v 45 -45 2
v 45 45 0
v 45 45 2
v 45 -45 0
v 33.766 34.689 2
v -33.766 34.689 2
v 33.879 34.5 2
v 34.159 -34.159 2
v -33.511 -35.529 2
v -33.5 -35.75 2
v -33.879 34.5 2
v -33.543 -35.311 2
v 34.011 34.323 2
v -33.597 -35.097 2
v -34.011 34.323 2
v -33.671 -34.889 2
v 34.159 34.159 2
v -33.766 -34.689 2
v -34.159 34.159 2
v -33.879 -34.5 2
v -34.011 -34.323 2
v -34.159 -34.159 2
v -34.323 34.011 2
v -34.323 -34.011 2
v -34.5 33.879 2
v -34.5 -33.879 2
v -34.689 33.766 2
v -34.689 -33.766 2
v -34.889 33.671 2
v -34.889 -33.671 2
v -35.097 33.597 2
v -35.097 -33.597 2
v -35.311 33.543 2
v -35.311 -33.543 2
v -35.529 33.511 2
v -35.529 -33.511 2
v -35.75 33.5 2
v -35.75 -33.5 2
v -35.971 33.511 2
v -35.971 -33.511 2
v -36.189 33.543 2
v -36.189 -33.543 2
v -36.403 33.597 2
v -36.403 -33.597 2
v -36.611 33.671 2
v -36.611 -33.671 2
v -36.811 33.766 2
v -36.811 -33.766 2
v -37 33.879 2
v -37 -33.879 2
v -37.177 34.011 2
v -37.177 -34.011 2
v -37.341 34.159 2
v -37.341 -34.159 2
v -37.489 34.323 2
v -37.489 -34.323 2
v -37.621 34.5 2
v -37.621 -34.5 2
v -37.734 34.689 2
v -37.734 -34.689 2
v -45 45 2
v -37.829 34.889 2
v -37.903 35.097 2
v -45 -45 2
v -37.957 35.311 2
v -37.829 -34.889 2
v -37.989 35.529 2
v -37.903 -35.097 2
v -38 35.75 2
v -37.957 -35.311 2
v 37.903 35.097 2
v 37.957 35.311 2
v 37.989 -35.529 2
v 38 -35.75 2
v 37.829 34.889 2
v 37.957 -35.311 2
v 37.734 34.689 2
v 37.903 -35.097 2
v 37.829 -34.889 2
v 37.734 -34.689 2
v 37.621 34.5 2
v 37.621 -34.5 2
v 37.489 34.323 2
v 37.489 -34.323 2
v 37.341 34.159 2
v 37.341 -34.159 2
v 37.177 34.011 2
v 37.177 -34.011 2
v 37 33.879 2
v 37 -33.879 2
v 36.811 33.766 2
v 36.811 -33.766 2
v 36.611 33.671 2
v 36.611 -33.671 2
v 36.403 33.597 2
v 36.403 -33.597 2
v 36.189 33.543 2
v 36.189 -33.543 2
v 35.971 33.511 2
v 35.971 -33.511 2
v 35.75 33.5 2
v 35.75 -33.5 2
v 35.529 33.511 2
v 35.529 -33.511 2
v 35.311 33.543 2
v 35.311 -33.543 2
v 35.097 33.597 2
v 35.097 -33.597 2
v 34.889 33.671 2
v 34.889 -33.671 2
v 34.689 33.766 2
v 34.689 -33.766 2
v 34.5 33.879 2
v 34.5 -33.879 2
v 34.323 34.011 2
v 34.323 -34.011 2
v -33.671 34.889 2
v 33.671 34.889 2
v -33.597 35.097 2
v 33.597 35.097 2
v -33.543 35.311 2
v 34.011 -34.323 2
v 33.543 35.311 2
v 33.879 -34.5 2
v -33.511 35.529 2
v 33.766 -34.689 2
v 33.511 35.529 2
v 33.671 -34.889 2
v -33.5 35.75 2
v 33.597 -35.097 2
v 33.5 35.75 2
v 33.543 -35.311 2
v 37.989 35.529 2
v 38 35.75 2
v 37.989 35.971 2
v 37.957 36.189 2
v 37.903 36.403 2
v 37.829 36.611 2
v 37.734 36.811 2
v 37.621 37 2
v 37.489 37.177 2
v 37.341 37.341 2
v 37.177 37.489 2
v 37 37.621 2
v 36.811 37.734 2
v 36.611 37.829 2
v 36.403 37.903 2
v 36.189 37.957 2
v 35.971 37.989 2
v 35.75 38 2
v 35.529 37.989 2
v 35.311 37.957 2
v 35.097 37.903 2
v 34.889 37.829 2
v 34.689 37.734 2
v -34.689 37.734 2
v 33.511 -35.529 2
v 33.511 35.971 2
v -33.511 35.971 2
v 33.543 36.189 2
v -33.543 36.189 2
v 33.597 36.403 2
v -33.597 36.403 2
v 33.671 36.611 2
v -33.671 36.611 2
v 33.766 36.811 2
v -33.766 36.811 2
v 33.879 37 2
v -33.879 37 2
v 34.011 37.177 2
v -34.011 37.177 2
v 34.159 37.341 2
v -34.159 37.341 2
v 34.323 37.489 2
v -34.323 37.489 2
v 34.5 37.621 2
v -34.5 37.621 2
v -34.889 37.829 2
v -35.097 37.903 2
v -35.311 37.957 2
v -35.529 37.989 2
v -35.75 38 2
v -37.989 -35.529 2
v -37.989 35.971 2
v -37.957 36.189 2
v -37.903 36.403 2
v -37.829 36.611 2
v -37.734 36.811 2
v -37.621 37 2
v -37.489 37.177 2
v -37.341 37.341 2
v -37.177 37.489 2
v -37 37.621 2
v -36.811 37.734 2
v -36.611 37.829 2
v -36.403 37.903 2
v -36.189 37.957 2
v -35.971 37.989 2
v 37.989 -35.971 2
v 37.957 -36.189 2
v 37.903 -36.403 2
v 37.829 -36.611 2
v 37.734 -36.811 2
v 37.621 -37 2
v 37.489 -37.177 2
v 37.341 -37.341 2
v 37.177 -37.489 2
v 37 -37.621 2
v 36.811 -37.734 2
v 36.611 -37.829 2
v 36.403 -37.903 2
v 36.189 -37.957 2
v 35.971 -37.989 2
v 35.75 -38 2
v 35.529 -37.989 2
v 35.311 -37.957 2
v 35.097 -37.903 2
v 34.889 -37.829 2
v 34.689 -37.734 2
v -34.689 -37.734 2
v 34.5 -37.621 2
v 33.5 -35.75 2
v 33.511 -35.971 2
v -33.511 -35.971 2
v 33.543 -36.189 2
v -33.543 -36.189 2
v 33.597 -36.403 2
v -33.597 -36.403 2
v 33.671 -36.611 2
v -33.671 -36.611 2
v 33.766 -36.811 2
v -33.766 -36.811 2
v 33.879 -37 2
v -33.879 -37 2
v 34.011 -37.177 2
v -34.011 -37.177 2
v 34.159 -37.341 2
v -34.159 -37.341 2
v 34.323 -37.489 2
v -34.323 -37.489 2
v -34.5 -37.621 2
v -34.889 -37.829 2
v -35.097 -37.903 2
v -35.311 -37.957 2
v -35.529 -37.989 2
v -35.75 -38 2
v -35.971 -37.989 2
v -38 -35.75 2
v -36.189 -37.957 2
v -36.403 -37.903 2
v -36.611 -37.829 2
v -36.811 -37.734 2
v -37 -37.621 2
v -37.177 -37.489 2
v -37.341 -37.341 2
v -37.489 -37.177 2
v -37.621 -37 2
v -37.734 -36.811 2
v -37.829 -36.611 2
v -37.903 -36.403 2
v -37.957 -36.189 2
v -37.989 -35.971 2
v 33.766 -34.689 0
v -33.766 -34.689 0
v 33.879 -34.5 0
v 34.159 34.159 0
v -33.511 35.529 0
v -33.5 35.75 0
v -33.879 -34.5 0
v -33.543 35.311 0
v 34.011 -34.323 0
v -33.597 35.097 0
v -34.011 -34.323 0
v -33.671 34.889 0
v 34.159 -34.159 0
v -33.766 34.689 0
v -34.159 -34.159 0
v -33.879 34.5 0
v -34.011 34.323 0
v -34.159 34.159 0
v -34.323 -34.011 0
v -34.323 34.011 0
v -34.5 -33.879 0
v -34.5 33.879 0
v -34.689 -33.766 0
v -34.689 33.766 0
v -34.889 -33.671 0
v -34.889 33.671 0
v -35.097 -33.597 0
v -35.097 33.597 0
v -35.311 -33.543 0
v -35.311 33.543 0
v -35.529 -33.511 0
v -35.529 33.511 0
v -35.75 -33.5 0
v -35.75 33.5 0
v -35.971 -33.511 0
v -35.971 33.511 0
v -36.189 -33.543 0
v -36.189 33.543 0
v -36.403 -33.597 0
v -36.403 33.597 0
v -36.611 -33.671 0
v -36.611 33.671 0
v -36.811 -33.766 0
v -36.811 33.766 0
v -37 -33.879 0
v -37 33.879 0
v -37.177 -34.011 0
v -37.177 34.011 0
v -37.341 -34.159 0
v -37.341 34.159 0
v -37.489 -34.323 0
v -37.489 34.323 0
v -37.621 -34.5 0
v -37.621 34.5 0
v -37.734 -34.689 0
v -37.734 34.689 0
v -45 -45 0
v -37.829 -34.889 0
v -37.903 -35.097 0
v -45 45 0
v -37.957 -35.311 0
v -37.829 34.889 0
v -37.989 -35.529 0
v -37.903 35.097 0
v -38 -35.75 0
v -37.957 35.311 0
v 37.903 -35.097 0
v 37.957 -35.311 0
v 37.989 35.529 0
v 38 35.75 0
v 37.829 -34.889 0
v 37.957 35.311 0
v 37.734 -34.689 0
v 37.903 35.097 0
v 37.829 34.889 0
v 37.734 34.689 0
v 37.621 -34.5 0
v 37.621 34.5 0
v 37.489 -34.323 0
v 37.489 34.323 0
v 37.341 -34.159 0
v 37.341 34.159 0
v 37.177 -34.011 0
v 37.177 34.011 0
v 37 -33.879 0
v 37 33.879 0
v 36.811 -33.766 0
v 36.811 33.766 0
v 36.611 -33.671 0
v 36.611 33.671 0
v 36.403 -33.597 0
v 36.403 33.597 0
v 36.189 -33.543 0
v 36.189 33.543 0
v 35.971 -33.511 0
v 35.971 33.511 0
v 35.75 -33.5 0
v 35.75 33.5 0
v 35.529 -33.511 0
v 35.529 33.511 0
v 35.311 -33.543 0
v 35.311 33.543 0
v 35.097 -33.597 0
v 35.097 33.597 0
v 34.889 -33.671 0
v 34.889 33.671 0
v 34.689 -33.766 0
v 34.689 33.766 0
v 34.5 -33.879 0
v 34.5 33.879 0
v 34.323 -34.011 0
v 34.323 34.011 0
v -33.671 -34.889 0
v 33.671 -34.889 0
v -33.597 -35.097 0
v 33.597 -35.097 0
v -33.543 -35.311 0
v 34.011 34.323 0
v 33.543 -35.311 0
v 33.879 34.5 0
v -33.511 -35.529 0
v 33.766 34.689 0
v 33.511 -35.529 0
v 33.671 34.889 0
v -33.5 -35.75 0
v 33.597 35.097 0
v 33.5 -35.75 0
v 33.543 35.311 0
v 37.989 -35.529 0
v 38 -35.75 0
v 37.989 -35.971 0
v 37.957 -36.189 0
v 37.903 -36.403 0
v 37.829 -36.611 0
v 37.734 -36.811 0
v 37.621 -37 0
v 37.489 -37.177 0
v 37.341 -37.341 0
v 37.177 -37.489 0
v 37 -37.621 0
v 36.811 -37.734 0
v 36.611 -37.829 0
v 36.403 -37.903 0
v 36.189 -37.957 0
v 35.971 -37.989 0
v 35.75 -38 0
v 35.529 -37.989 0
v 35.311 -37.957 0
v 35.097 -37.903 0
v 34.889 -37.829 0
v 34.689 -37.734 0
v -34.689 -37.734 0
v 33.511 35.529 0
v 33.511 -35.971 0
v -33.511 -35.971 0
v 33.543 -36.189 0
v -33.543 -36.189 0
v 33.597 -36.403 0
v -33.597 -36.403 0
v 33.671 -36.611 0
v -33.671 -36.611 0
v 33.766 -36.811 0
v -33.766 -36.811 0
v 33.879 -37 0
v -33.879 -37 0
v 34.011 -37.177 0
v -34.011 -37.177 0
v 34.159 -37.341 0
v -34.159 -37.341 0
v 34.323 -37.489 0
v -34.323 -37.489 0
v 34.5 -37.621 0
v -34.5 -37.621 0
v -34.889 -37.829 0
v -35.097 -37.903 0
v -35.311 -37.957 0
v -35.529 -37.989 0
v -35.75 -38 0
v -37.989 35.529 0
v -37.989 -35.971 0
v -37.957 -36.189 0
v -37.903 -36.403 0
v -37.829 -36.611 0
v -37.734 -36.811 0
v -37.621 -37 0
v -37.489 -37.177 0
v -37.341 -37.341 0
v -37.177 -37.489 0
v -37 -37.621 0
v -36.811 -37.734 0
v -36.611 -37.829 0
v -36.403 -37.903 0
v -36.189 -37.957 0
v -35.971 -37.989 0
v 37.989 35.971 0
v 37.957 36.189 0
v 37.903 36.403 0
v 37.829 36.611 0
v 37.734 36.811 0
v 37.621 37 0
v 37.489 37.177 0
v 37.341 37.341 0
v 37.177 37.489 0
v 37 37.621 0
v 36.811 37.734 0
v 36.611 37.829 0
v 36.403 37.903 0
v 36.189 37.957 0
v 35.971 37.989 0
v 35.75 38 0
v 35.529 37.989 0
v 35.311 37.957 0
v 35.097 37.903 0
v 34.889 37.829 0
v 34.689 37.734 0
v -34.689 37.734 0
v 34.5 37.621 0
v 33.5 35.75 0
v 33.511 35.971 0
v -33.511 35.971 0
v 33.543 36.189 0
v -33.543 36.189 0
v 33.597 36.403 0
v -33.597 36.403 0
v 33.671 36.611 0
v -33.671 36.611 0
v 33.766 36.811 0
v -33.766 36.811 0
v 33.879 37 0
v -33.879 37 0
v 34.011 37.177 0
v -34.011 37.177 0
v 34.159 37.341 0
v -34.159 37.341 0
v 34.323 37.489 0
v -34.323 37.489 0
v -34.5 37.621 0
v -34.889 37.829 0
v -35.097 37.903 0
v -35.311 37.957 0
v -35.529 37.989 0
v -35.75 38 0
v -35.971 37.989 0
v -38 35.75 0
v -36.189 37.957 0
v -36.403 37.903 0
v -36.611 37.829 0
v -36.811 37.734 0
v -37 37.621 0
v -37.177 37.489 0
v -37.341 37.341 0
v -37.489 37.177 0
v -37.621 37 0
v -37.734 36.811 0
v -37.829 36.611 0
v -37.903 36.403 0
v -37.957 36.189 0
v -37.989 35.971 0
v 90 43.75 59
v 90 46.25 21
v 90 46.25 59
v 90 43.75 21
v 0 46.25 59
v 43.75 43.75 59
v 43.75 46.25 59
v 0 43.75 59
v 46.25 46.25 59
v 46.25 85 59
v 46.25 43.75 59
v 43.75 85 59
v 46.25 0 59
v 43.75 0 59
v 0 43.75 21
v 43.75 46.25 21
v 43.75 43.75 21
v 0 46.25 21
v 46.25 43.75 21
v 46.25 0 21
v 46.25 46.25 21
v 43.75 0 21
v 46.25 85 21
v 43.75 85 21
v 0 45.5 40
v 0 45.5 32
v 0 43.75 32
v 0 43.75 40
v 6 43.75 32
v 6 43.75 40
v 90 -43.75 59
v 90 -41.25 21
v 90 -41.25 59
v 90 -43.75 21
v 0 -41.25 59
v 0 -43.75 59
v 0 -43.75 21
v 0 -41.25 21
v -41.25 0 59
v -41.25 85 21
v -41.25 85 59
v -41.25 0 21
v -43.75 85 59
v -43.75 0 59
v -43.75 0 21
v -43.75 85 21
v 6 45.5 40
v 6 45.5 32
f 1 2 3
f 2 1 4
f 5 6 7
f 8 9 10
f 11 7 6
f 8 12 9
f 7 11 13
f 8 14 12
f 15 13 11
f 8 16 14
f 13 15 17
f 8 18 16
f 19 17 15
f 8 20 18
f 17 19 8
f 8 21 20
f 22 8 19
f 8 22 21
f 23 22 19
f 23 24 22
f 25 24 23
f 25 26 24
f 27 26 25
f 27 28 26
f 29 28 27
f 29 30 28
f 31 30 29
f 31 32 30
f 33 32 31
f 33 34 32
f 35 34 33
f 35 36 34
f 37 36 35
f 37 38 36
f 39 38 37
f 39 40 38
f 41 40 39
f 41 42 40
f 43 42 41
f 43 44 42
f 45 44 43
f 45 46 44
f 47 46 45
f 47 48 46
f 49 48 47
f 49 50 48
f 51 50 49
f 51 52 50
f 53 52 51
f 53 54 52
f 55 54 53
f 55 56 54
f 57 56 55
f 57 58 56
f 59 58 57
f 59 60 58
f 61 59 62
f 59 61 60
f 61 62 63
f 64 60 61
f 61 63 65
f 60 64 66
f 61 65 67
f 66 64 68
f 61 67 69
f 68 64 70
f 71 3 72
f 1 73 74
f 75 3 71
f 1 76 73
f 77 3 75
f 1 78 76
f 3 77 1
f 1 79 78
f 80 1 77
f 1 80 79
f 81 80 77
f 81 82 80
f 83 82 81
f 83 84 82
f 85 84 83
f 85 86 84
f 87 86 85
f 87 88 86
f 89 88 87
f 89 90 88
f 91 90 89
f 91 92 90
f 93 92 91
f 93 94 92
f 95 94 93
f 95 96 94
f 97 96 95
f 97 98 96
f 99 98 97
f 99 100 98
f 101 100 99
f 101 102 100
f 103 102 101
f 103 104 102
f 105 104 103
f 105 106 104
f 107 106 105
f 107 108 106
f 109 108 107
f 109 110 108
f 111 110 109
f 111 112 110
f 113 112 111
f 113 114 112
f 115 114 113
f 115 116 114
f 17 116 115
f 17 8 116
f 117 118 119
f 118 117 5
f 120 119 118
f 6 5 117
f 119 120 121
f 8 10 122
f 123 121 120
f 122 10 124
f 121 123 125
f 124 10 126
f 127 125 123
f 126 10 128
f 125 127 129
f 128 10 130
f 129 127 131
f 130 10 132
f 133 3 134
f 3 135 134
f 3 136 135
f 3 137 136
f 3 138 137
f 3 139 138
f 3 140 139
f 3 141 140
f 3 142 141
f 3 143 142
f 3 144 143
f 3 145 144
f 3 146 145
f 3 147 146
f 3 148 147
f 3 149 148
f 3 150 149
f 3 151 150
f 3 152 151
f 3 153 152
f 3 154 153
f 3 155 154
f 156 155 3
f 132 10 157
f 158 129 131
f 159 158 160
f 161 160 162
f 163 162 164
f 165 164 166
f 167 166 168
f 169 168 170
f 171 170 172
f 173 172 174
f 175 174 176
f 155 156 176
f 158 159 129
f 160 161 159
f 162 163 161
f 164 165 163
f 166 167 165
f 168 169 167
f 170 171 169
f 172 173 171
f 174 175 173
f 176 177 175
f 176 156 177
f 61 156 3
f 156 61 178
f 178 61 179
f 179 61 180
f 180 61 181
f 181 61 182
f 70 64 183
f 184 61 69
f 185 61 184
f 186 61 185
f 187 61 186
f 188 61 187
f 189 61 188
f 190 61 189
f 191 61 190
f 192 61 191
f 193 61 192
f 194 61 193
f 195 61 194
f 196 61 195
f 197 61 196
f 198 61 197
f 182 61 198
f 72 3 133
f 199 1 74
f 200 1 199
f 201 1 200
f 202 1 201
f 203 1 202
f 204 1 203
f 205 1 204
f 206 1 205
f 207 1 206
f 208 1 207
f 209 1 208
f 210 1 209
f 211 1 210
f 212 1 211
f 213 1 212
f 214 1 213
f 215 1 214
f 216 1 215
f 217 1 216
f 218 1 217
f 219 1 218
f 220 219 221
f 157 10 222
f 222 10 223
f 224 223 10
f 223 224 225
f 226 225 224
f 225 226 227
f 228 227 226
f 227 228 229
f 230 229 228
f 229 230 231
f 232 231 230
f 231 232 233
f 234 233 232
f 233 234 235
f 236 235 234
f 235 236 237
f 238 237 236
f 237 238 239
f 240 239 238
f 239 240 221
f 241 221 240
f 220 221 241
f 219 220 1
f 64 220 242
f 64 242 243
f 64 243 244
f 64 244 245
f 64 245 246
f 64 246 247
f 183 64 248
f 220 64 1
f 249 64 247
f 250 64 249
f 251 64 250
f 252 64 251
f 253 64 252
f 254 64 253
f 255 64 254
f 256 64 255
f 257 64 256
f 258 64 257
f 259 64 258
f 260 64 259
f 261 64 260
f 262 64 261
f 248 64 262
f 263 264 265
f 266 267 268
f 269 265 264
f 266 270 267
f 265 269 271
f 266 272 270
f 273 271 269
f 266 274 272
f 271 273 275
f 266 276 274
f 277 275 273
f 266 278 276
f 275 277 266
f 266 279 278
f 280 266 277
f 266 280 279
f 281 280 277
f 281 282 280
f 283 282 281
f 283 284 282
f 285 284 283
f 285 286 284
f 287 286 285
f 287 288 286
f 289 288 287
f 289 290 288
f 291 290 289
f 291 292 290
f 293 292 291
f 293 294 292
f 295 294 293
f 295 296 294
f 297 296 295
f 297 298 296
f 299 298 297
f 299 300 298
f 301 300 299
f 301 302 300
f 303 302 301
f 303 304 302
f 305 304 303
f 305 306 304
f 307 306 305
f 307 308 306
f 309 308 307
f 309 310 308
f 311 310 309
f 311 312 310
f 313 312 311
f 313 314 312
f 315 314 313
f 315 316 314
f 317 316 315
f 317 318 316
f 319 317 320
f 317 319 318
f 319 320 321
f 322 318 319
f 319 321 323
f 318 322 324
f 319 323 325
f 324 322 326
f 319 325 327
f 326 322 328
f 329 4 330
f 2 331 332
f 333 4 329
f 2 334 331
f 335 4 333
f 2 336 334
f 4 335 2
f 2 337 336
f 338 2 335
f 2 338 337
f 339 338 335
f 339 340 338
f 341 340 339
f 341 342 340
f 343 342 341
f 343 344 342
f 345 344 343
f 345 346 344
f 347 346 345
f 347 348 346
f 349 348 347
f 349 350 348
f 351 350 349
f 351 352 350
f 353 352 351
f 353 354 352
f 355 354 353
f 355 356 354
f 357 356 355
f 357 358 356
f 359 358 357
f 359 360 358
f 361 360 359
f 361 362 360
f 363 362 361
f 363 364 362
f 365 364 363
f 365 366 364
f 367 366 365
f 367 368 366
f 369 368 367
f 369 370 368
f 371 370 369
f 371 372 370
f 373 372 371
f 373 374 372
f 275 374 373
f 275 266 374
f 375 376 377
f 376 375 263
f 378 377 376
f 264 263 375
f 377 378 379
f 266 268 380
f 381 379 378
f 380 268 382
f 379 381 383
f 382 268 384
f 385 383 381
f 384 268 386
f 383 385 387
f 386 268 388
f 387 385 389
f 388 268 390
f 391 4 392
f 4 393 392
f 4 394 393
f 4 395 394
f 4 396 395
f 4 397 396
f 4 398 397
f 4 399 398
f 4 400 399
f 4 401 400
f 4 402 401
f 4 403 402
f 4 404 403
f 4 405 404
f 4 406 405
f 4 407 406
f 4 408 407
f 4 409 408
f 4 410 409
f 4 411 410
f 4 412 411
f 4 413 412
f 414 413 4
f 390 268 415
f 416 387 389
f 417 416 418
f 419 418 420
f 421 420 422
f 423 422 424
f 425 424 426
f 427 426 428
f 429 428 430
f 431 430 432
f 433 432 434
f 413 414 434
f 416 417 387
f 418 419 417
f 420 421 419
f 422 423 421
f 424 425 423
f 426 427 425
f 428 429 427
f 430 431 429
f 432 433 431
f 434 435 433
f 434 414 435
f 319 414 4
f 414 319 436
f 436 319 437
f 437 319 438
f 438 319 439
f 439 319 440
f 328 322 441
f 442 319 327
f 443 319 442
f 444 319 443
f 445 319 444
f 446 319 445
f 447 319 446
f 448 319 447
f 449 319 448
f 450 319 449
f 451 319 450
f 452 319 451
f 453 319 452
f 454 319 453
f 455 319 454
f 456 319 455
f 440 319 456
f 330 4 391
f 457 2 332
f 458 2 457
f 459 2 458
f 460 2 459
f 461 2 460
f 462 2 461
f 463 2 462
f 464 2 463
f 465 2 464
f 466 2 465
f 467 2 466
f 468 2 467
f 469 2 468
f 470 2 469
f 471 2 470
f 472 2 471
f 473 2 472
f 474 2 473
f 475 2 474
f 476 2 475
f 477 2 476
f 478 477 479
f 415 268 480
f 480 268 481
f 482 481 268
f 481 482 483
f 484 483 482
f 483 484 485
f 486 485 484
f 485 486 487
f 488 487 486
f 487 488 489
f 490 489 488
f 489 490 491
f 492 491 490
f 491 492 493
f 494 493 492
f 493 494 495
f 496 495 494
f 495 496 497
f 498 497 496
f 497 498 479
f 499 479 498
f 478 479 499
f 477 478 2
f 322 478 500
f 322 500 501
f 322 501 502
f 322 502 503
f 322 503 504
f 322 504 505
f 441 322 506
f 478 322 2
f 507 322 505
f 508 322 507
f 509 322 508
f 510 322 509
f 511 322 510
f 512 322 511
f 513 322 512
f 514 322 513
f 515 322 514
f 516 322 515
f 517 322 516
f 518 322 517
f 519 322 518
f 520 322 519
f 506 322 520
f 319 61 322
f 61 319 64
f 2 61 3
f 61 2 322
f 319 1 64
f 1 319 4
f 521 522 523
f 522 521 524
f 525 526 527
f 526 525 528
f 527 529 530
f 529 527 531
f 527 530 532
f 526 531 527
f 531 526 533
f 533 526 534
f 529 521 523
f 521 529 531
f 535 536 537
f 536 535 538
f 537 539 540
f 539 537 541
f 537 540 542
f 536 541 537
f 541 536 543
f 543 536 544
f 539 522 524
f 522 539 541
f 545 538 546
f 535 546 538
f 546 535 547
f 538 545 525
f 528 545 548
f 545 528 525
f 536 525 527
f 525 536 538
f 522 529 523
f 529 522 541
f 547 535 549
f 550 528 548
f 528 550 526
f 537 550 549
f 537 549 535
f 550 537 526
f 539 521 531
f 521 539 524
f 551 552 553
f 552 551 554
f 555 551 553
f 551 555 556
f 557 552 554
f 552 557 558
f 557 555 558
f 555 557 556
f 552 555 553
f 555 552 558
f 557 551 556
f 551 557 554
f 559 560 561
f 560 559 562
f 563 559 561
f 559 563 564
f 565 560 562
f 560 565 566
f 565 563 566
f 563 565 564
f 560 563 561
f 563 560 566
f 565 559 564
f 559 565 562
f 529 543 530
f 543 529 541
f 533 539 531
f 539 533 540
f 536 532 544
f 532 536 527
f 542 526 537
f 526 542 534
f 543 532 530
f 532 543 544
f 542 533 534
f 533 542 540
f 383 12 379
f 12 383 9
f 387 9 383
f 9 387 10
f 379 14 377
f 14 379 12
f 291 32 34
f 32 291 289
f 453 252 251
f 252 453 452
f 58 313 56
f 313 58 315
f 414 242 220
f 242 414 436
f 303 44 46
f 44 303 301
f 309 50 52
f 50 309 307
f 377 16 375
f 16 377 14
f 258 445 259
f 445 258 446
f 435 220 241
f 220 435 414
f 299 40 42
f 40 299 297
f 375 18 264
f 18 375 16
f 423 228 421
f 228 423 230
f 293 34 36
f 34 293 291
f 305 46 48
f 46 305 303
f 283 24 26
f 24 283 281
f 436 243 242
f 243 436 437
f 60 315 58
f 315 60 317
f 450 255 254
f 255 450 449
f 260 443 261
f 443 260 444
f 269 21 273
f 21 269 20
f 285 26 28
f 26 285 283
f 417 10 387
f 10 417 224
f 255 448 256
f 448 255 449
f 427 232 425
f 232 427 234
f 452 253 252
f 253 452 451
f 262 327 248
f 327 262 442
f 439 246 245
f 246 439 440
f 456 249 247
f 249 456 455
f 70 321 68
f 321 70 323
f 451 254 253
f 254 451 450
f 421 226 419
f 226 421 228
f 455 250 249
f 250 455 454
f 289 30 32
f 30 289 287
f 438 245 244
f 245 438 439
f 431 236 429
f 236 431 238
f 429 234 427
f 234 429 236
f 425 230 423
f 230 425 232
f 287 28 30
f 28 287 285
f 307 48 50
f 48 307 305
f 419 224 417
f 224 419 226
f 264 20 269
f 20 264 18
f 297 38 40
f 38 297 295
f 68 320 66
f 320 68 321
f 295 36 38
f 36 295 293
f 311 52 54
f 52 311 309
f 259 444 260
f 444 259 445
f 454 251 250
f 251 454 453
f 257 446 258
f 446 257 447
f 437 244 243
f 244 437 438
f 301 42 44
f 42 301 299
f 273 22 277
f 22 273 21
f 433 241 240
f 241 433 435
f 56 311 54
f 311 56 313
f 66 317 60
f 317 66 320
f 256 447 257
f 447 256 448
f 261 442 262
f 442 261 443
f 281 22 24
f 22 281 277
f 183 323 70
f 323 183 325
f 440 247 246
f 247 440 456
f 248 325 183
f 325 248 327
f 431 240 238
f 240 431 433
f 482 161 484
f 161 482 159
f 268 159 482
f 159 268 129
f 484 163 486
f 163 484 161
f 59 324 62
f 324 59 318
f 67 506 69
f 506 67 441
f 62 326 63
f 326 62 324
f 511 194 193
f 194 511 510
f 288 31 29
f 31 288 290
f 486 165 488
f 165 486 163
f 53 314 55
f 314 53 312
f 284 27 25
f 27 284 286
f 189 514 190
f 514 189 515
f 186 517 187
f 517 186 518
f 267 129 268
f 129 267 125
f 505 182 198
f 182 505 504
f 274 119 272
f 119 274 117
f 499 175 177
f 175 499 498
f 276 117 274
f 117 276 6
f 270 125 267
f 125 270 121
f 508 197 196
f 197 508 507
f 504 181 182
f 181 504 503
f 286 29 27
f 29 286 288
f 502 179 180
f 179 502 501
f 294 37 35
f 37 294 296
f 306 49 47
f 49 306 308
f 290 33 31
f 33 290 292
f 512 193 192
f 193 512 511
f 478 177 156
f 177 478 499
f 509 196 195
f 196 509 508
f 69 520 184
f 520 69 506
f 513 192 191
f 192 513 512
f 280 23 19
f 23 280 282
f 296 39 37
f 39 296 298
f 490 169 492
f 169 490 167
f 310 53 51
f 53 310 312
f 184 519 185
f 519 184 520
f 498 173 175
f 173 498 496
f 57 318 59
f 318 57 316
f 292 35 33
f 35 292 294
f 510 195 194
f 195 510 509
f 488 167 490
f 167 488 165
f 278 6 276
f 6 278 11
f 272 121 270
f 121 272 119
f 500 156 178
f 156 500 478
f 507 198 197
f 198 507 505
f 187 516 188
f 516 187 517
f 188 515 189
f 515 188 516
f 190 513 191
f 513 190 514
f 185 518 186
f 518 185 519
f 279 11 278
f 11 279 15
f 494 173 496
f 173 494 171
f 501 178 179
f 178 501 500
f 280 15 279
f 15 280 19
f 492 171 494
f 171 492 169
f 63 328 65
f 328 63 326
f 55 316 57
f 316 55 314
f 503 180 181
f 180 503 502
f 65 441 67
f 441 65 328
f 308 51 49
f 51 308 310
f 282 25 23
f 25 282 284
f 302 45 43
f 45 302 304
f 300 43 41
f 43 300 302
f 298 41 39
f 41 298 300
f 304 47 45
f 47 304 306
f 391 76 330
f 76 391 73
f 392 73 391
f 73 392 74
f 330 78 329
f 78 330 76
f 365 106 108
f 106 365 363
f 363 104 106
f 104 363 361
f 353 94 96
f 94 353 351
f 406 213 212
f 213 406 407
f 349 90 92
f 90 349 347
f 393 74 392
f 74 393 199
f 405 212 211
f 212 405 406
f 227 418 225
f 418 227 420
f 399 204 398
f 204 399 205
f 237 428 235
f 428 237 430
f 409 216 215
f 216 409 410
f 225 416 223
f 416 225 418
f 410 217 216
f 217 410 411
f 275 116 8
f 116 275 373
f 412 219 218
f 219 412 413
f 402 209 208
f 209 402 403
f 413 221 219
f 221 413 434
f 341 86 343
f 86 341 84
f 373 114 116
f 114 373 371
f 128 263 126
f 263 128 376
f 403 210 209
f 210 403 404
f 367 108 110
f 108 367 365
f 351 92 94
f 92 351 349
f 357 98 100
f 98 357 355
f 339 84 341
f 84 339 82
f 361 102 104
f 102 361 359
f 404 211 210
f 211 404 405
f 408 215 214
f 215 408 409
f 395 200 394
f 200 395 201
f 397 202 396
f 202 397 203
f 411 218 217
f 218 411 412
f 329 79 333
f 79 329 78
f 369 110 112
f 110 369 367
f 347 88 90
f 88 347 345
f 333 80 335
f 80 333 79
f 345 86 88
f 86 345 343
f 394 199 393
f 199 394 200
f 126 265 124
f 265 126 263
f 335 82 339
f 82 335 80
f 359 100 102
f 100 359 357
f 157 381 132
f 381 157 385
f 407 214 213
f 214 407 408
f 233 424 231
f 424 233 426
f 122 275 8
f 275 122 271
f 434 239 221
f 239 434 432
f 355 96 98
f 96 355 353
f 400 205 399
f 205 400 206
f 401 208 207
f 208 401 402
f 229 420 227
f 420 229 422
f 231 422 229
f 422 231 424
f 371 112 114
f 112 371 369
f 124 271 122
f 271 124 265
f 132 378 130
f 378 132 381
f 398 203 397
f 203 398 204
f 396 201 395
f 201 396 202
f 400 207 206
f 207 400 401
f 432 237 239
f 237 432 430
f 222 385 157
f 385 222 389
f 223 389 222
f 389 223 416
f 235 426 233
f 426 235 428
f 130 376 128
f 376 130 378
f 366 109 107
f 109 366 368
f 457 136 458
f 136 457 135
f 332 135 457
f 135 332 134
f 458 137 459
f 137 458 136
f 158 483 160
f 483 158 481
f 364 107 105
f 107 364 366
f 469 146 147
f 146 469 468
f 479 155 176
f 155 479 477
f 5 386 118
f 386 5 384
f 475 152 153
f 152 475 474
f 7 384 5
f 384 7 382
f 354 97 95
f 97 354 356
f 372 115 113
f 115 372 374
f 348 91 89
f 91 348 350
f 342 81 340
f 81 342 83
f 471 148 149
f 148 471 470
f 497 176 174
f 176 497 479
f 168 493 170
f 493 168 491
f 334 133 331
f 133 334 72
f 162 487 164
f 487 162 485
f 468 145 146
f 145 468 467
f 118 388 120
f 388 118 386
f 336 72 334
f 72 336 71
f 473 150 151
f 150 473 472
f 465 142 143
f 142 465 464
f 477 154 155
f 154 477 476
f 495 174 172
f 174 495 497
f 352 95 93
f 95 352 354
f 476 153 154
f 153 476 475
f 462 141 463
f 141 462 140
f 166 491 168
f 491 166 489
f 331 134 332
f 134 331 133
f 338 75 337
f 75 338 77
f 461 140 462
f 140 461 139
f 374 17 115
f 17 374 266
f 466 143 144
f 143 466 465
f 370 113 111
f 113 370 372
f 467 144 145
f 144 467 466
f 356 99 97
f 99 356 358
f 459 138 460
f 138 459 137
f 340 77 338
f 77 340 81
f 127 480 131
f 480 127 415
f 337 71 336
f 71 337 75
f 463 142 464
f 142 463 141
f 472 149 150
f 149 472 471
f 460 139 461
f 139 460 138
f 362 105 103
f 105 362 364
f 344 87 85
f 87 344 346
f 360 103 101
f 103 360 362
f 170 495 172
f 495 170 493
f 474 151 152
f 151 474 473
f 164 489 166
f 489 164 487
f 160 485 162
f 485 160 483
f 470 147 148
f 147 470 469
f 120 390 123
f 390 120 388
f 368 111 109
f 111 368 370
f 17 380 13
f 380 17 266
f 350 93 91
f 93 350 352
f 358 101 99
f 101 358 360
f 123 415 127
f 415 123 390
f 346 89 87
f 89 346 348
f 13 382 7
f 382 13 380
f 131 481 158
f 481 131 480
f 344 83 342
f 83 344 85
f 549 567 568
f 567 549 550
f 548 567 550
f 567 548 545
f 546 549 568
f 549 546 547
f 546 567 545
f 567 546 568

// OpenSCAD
// Dimensions (mm)
top_plate_thickness = 2;
wall_thickness = 2.5;
wall_height = 40;
outer_size = 90;
screw_hole_dia = 4.5;
screw_pattern_size = 71.5;
cable_notch_width = 12;
cable_notch_depth = 8;

// Derived dimensions
inner_size = outer_size - 2 * wall_thickness;
half_outer = outer_size / 2;
half_pattern = screw_pattern_size / 2;

$fn = 64;

difference() {
    // Main housing body
    union() {
        // Top plate (rests on bed, z=0 to 2)
        translate([0, 0, top_plate_thickness/2])
            cube([outer_size, outer_size, top_plate_thickness], center = true);
        
        // Four walls rising from top plate to z=40
        // Front wall (positive Y)
        translate([0, half_outer - wall_thickness/2, top_plate_thickness + (wall_height - top_plate_thickness)/2])
            cube([outer_size, wall_thickness, wall_height - top_plate_thickness]);
        
        // Back wall (negative Y)
        translate([0, -half_outer + wall_thickness/2, top_plate_thickness + (wall_height - top_plate_thickness)/2])
            cube([outer_size, wall_thickness, wall_height - top_plate_thickness]);
        
        // Left wall (negative X)
        translate([-half_outer + wall_thickness/2, 0, top_plate_thickness + (wall_height - top_plate_thickness)/2])
            cube([wall_thickness, outer_size - 2*wall_thickness, wall_height - top_plate_thickness]);
        
        // Right wall (positive X)
        translate([half_outer - wall_thickness/2, 0, top_plate_thickness + (wall_height - top_plate_thickness)/2])
            cube([wall_thickness, outer_size - 2*wall_thickness, wall_height - top_plate_thickness]);
    }
    
    // Four M4 screw holes through top plate on 71.5 mm square pattern
    for (x = [-half_pattern, half_pattern]) {
        for (y = [-half_pattern, half_pattern]) {
            translate([x, y, -0.5])
                cylinder(r = screw_hole_dia/2, h = top_plate_thickness + 1, center = false);
        }
    }
    
    // Cable notch in one wall (front wall, positive Y)
    // Notch is 12 mm wide, centered along the wall, reaching 8 mm down from open edge (z=32 to z=40)
    translate([0, half_outer - wall_thickness/2, wall_height - cable_notch_depth/2])
        cube([cable_notch_width, wall_thickness + 1, cable_notch_depth], center = true);
}
